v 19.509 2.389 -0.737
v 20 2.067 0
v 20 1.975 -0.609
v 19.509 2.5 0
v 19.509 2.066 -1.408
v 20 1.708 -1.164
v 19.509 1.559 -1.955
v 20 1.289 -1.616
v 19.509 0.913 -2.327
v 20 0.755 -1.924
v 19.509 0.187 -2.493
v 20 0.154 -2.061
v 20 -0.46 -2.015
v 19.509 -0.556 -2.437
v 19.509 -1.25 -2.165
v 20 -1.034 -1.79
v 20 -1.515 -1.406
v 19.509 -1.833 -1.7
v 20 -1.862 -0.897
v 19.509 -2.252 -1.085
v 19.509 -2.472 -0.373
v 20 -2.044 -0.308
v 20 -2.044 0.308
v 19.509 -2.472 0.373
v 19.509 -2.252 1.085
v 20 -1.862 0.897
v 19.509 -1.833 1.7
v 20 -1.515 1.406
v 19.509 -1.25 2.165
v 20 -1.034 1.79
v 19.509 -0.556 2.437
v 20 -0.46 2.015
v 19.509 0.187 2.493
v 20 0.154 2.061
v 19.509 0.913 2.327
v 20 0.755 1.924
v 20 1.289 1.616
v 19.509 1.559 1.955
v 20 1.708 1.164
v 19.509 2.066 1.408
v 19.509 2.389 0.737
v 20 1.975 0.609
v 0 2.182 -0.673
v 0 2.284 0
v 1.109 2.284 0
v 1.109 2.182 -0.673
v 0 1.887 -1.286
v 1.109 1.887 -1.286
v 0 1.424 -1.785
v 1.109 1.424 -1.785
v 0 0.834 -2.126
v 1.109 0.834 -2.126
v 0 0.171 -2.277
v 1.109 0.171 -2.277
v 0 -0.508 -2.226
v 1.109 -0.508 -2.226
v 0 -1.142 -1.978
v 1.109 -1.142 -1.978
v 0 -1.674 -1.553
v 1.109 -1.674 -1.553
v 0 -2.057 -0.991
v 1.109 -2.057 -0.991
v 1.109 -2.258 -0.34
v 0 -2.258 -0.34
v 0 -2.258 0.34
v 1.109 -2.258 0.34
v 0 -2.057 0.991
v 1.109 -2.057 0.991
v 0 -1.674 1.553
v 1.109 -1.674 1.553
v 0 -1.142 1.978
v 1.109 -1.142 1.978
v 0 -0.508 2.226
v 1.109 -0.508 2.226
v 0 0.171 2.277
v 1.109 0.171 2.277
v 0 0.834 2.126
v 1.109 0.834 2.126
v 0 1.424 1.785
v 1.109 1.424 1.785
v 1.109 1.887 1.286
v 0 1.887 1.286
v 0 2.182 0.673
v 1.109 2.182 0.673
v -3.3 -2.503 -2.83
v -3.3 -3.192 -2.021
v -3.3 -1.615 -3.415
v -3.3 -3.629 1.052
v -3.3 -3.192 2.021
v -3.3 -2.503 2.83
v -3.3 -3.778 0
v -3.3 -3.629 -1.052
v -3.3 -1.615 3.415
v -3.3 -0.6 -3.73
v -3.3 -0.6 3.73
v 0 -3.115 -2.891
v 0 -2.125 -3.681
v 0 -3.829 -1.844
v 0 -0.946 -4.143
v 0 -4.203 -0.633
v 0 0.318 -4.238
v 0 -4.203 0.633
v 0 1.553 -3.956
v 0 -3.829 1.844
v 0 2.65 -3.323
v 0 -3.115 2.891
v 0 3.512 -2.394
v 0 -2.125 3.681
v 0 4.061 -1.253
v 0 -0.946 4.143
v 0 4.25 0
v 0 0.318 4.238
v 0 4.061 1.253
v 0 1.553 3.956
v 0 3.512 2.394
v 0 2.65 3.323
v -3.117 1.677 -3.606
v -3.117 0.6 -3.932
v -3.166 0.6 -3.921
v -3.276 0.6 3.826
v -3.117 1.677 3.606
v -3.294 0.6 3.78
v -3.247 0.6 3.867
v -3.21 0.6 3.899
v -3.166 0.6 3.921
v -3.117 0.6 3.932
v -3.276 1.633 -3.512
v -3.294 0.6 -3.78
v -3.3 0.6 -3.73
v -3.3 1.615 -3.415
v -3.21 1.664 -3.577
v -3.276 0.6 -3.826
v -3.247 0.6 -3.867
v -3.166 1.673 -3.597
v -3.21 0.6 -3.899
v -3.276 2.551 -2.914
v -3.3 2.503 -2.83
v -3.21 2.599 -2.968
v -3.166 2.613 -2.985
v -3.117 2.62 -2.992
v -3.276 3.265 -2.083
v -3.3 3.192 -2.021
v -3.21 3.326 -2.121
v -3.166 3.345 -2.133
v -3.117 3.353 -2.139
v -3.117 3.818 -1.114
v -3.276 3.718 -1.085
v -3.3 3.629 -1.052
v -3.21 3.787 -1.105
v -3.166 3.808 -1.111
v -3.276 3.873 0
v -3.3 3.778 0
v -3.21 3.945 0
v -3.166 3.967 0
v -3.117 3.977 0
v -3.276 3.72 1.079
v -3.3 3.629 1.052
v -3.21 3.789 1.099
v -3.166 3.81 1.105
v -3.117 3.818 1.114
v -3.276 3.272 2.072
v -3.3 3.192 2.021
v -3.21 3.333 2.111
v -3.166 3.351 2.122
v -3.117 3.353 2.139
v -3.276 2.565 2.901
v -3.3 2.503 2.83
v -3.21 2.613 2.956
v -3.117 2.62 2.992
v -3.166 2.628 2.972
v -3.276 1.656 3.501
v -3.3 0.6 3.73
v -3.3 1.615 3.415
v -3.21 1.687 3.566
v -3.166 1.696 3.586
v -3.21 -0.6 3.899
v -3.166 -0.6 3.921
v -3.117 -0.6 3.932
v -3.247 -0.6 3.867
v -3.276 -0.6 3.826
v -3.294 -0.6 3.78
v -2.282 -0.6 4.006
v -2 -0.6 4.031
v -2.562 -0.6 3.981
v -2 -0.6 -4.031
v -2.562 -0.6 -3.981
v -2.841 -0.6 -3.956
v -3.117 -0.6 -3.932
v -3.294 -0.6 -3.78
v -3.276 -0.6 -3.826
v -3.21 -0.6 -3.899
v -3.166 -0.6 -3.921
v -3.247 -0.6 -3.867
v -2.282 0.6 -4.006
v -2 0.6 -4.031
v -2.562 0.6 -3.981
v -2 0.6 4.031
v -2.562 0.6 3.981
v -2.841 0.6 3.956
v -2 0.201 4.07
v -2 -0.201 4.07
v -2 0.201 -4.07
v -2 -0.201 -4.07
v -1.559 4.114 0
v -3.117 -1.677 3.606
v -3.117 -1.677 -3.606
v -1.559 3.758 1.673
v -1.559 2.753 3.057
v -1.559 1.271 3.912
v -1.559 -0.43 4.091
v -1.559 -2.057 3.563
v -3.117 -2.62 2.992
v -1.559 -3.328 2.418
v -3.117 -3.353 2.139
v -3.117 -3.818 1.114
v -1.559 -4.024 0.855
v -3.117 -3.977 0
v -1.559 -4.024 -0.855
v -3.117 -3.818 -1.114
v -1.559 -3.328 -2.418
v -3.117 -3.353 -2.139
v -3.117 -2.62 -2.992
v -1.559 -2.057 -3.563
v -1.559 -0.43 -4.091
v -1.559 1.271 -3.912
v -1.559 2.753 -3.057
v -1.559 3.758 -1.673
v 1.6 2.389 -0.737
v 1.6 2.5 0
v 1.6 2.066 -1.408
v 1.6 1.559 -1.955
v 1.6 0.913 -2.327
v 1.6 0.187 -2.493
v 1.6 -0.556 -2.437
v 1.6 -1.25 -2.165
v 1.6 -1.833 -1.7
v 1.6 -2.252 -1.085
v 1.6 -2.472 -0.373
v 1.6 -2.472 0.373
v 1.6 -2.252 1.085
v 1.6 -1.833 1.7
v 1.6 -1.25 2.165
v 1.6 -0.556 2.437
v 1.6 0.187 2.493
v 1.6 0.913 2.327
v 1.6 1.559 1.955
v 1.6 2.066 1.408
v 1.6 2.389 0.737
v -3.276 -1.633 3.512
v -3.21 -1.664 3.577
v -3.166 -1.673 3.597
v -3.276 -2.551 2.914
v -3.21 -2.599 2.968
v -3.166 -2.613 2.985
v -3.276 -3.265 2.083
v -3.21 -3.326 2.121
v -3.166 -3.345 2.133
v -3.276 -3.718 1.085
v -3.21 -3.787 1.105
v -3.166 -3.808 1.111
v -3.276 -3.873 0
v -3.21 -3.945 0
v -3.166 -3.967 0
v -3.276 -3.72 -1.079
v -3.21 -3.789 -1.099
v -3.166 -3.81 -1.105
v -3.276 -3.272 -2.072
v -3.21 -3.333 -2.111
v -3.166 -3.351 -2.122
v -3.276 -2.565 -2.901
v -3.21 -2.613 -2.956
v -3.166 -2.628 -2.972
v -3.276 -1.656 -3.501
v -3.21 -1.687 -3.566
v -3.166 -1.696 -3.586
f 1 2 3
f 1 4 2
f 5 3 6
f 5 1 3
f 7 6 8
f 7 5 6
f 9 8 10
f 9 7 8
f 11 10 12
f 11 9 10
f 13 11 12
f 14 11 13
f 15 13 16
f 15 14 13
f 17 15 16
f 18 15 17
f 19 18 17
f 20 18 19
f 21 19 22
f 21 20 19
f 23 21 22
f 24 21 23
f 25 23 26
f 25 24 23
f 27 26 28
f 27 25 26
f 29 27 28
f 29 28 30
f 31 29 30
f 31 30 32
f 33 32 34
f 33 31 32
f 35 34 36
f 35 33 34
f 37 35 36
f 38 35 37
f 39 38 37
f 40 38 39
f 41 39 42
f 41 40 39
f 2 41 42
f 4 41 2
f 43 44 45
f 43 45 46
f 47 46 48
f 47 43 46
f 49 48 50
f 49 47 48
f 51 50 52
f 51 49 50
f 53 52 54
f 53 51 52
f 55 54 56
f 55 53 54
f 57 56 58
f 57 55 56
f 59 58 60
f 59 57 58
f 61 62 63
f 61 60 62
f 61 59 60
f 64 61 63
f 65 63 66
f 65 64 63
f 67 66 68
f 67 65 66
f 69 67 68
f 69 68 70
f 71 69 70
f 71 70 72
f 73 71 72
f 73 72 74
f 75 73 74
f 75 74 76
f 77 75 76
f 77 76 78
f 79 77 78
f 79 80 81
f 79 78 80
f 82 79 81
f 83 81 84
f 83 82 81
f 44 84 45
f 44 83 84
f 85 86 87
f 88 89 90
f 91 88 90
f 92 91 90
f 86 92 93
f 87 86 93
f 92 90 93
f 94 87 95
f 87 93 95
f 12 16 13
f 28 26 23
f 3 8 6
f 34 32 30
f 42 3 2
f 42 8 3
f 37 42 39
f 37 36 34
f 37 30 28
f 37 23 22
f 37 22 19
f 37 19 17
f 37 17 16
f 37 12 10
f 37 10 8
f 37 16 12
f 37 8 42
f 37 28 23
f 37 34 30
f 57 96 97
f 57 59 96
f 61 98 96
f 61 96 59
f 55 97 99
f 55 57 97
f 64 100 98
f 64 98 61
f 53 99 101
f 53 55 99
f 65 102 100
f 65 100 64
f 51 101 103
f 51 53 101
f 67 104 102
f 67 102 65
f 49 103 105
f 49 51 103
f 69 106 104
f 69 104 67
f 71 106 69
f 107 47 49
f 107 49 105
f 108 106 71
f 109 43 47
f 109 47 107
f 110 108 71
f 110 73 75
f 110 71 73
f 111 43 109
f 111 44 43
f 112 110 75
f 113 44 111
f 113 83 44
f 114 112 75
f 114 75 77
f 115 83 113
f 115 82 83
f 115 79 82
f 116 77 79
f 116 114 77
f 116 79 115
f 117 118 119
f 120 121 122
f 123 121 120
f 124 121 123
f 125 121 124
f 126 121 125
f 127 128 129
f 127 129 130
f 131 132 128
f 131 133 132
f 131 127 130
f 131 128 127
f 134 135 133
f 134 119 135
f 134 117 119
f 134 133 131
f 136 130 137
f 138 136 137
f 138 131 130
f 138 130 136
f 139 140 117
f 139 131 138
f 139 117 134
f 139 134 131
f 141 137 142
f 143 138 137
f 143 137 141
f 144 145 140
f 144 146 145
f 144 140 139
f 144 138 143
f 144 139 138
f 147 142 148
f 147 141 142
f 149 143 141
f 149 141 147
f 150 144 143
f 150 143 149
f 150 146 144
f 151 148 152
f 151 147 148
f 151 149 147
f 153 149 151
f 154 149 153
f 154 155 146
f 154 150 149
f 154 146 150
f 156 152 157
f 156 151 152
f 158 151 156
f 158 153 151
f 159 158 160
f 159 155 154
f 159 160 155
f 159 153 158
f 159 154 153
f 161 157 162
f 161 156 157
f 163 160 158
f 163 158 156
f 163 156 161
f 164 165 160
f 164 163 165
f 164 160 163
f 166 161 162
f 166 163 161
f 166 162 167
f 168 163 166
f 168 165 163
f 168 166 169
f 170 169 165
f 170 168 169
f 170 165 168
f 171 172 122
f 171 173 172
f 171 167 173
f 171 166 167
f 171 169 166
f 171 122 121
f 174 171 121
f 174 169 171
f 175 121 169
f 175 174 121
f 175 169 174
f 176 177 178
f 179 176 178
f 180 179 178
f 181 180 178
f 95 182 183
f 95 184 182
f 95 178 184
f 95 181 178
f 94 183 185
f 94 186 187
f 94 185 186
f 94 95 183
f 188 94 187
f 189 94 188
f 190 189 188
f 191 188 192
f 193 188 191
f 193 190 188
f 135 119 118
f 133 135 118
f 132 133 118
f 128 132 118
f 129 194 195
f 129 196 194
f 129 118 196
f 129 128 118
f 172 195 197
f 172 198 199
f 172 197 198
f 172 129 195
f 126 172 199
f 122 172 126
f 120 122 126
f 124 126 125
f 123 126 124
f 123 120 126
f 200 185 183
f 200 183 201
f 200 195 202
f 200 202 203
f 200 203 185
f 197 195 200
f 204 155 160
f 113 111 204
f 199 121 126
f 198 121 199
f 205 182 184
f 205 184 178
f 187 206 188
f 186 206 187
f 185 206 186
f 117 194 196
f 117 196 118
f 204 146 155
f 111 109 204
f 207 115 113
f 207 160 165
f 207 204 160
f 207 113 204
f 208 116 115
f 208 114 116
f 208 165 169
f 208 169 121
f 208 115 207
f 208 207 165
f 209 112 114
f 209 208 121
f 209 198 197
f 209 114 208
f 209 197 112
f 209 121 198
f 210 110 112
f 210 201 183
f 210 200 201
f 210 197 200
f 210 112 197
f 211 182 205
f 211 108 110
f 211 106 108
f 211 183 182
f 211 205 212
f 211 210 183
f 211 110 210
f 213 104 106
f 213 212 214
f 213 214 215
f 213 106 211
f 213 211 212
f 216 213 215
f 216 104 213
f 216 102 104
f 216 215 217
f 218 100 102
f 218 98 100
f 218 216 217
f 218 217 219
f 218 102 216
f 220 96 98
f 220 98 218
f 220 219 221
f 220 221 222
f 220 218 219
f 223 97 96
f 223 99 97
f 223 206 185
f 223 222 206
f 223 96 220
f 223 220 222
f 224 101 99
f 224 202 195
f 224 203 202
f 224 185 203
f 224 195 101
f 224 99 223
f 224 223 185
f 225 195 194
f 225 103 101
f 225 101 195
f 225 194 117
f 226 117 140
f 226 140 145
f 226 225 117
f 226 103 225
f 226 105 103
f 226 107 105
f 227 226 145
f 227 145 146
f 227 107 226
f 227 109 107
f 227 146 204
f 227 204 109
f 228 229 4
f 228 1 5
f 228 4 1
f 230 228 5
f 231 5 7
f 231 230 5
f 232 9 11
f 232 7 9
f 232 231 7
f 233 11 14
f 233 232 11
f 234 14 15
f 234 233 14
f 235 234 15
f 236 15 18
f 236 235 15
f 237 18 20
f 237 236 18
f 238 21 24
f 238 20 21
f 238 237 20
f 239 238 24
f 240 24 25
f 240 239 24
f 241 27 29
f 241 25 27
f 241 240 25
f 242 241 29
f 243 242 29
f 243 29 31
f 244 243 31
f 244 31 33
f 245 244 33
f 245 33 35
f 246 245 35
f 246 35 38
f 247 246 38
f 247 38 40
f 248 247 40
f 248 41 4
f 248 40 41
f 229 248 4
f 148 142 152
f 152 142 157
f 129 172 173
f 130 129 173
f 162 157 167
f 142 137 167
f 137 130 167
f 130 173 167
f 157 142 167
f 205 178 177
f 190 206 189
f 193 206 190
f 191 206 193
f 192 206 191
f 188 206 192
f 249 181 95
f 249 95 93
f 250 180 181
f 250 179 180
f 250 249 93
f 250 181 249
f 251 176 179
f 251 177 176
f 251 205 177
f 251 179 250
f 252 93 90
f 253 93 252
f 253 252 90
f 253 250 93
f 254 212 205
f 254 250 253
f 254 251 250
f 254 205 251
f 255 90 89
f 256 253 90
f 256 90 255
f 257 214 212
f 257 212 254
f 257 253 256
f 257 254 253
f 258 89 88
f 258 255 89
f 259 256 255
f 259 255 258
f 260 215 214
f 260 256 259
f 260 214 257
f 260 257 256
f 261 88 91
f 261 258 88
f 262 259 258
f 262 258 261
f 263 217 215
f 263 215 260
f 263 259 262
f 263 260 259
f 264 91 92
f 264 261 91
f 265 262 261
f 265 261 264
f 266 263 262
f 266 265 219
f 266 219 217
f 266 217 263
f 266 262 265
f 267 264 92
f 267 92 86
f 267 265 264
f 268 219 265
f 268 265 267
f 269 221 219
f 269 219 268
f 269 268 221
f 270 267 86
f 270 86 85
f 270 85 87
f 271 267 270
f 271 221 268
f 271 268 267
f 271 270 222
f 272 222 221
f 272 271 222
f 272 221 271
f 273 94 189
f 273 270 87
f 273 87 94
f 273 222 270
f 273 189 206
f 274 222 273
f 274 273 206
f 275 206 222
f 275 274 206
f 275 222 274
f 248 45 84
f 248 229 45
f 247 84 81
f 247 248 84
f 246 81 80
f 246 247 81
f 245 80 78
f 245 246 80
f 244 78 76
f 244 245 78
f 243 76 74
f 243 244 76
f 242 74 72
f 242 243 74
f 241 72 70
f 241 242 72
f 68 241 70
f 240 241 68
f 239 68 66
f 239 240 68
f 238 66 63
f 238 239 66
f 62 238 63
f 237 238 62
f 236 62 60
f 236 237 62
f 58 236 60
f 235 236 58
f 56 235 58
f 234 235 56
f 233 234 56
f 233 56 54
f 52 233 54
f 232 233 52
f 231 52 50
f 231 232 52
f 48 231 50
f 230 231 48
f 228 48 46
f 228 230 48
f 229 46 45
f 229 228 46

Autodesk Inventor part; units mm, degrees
ref_plane "YZ Plane" through (0, 0, 0) normal (1, 0, 0) x (0, 1, 0)
ref_plane "XZ Plane" through (0, 0, 0) normal (0, 1, 0) x (-1, 0, 0)
sketch "Sketch1" plane through (0, 0, 0) normal (0, 0, 1) x (1, 0, 0)
  line L0 (-3.3, 0) -> (20, 0)
  line L1 (20, 0) -> (20, 2.5)
  line L2 (20, 2.5) -> (1.6, 2.5)
  line L3 (1.6, 2.5) -> (1.1091, 2.2835)
  line L4 (1.1091, 2.2835) -> (0, 2.2835)
  line L5 (0, 2.2835) -> (0, 4.25)
  line L6 (-7.96, 0) -> (24.66, 0) projected
  line L7 (0, -0.85) -> (0, 5.1) projected
  line L8 (-3.3, 0) -> (-3.3, 3.9613)
  line L9 (0, 4.25) -> (-3.3, 3.9613)
  line L10 (1.6, 2.5) -> (0, 2.5) construction
  dimension "d0" = 20
  dimension "d1" = 18.4
  dimension "d2" = 0.4909
  dimension "d3" = 3.3
  dimension "d4" = 5
  dimension "d5" = 4.567
  dimension "d9" = 8.5
  dimension "d10" = 5
revolve "Body" add sketch "Sketch1" angle 360 about axis through (-3.3, 0, 0) along (1, 0, 0)
sketch "Sketch2" plane through (-3.3, 0, 0) normal (-1, 0, 0) x (0, 0, 1)
  circle A0 centre (0, 0) radius 4.25 projected
  line L0 (0, 0) -> (0, 3.9613) projected
  line L1 (-4.25, 0.6) -> (4.25, 0.6)
  line L2 (4.25, 0.6) -> (4.25, -0.6)
  line L3 (4.25, -0.6) -> (-4.25, -0.6)
  line L4 (-4.25, -0.6) -> (-4.25, 0.6)
  line L5 (-4.25, 0) -> (4.25, 0) construction
  line L6 (0, 0.6) -> (0, -0.6) construction
  point P0 (0, 0)
  dimension "d11" = 1.2
  dimension "d12" = 8.5
fillet "Fillet1" radius 0.2 1 edges at (-3.3, -3.9613, 0)
extrude "Slot" cut sketch "Sketch2" against normal blind 1.3 contours A0 L3 L1 | L2 L3 A0 | A0 L1 L2 | A0 L4 L1 | L3 L4 A0
thread "Thread" size "M5x0.8" class "6g" standard "ISO Metric profile" length 18.4
chamfer "Chamfer1" distance 0.433 distance2 0.4909 1 edges at (20, -2.5, 0) measured on face at (20, 1.2612, -0.6619)
ref_plane "Work Plane1" through (30.1625, 0, 0) normal (0, 0, -1) x (1, 0, 0)
equation "\"d11\" = SBR"
equation "\"d12\" = KOD"
equation "\"d14\" = RR"
equation "\"d19\" = STI"
equation "\"d15\" = GEL"
equation "\"d17\" = -0.5 * SPD + 0.5 * GD"
equation "\"d0\" = NLG"
equation "\"d1\" = GEL"
equation "\"d3\" = KOH"
equation "\"d4\" = GD"
equation "\"d5\" = BDM"
equation "\"d9\" = KOD"
equation "\"d10\" = KEWI"
equation "\"GD\" = 5"
equation "\"NLG\" = 20"
equation "\"GEL\" = 18.4"
equation "\"KOD\" = 8.5"
equation "\"KOH\" = 3.3"
equation "\"GAL\" = 0.61345 * PTC"
equation "\"SPD\" = 4.13397"
equation "\"BDM\" = 4.56699"
equation "\"GUL\" = 0.61345 * PTC"
equation "\"RR\" = 0.2"
equation "\"SBR\" = 1.2"
equation "\"STI\" = 1.3"
equation "\"KEWI\" = 5deg"
equation "\"PTC\" = 0.8"
equation "\"THREADDIA\" = 5"
equation "\"TOA\" = 30deg"
equation "\"NND\" = 5"
equation "\"GD1\" = THREADDIA - 1.2269 * PTC"
properties part number "DIN 84 - M5 x 20" material "Steel, Mild"
